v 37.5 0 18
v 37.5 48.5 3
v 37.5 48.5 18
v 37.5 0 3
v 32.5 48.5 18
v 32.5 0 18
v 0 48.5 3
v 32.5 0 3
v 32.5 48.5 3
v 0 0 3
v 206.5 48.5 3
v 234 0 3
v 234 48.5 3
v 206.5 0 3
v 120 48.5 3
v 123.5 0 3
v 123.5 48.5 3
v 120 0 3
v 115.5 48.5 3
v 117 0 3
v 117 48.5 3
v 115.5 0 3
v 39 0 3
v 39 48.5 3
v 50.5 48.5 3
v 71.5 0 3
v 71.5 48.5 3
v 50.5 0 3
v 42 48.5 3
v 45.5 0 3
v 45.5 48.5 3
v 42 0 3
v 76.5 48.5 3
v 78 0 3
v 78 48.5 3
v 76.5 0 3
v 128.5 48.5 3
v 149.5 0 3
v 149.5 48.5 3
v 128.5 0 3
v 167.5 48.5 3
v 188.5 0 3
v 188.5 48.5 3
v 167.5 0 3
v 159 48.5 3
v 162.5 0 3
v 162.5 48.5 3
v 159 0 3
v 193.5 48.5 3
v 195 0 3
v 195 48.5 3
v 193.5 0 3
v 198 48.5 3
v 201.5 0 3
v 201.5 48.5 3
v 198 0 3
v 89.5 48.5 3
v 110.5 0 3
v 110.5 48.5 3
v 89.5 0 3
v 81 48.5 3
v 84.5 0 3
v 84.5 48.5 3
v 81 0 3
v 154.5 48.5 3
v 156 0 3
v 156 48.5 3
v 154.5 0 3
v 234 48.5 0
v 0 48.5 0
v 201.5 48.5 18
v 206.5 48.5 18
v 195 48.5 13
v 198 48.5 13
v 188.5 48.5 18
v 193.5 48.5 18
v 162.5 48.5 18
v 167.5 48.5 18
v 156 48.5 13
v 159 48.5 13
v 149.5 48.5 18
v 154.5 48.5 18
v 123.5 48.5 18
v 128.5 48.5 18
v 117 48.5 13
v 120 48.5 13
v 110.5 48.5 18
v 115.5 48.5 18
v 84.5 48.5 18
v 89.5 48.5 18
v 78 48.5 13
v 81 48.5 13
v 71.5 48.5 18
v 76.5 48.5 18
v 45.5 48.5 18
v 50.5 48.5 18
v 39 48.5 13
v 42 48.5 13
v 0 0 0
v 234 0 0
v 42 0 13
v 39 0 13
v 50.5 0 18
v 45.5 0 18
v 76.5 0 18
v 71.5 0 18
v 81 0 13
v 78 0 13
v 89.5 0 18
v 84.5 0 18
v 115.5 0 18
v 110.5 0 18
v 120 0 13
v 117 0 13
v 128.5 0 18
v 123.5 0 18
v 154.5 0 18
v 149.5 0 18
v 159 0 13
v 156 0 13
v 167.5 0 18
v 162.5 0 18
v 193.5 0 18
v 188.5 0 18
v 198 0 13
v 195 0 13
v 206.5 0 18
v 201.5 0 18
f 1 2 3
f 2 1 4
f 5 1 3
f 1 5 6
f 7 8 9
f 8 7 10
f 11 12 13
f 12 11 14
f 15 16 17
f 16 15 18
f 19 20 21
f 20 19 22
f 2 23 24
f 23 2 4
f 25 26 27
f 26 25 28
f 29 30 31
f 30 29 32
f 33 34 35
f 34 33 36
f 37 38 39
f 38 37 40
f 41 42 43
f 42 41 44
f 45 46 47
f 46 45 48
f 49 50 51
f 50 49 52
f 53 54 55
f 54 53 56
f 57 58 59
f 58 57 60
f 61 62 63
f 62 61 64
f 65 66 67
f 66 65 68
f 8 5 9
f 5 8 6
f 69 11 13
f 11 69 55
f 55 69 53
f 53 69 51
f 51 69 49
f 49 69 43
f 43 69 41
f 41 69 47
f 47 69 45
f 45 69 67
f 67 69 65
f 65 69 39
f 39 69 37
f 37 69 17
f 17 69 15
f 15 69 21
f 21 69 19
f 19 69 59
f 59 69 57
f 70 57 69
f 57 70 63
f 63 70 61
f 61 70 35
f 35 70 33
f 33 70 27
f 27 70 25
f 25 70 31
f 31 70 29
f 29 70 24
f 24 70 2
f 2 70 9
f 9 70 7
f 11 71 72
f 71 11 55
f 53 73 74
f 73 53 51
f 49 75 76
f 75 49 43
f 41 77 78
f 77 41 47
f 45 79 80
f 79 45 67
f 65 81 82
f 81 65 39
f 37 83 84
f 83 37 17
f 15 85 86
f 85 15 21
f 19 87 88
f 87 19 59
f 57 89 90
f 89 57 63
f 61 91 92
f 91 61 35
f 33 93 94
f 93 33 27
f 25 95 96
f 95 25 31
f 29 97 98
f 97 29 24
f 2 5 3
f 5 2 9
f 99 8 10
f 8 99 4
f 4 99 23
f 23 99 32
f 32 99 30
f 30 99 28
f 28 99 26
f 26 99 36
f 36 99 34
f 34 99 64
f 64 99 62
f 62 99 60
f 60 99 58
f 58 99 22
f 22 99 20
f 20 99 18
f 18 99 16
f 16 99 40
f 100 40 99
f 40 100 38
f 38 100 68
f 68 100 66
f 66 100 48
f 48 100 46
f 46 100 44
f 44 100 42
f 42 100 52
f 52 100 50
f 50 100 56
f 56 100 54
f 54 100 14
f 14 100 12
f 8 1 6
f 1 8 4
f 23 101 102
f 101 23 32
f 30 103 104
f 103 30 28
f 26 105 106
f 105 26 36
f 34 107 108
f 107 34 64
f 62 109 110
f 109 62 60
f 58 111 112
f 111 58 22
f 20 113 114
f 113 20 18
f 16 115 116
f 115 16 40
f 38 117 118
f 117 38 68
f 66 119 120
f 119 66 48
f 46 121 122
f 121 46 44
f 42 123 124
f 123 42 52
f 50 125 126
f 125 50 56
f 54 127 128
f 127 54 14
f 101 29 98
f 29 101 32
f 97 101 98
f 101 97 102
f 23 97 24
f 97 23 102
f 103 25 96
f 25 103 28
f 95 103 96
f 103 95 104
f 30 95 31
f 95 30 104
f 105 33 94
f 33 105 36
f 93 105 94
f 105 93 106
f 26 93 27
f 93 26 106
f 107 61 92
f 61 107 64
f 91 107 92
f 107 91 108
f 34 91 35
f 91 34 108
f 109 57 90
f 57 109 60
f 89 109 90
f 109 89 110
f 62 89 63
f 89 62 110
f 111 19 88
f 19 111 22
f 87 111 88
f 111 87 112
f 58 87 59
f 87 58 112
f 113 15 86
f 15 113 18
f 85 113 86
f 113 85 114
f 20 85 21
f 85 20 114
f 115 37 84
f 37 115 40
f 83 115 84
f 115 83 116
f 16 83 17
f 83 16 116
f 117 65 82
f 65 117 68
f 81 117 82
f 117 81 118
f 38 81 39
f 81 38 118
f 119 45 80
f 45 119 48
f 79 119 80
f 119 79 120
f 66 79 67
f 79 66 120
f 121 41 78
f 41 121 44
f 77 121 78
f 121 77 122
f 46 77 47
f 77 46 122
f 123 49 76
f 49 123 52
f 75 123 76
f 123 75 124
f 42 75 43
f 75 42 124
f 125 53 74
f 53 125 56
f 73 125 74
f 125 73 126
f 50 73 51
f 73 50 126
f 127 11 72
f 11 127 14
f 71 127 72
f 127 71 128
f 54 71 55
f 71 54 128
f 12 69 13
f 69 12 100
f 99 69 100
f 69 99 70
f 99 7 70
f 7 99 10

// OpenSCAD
// Parameters
bracket_length = 234;
bracket_width = 48.5;
bracket_height = 3;
slots = 5;
slot_width = 3;
slot_height = 5;
notch_width = 5;
notch_height = 15;

slot_interval = bracket_length / (slots + 1);
slot_shift = (notch_width + slot_width / 2);

// Bracket
union() {
    cube([bracket_length, bracket_width, bracket_height]);
    for (x=[slot_interval:slot_interval:(bracket_length - slot_interval)]){
        translate([(x - slot_shift), 0, bracket_height]) {
            cube([notch_width, bracket_width, notch_height]);
        }
        translate([(x), 0, bracket_height]) {
            color("green") {
                cube([slot_width, bracket_width, (notch_height - slot_height)]);
            }
        }
        translate([(x + slot_shift), 0, bracket_height]) {
            cube([notch_width, bracket_width, notch_height]);
        }
    }
}
